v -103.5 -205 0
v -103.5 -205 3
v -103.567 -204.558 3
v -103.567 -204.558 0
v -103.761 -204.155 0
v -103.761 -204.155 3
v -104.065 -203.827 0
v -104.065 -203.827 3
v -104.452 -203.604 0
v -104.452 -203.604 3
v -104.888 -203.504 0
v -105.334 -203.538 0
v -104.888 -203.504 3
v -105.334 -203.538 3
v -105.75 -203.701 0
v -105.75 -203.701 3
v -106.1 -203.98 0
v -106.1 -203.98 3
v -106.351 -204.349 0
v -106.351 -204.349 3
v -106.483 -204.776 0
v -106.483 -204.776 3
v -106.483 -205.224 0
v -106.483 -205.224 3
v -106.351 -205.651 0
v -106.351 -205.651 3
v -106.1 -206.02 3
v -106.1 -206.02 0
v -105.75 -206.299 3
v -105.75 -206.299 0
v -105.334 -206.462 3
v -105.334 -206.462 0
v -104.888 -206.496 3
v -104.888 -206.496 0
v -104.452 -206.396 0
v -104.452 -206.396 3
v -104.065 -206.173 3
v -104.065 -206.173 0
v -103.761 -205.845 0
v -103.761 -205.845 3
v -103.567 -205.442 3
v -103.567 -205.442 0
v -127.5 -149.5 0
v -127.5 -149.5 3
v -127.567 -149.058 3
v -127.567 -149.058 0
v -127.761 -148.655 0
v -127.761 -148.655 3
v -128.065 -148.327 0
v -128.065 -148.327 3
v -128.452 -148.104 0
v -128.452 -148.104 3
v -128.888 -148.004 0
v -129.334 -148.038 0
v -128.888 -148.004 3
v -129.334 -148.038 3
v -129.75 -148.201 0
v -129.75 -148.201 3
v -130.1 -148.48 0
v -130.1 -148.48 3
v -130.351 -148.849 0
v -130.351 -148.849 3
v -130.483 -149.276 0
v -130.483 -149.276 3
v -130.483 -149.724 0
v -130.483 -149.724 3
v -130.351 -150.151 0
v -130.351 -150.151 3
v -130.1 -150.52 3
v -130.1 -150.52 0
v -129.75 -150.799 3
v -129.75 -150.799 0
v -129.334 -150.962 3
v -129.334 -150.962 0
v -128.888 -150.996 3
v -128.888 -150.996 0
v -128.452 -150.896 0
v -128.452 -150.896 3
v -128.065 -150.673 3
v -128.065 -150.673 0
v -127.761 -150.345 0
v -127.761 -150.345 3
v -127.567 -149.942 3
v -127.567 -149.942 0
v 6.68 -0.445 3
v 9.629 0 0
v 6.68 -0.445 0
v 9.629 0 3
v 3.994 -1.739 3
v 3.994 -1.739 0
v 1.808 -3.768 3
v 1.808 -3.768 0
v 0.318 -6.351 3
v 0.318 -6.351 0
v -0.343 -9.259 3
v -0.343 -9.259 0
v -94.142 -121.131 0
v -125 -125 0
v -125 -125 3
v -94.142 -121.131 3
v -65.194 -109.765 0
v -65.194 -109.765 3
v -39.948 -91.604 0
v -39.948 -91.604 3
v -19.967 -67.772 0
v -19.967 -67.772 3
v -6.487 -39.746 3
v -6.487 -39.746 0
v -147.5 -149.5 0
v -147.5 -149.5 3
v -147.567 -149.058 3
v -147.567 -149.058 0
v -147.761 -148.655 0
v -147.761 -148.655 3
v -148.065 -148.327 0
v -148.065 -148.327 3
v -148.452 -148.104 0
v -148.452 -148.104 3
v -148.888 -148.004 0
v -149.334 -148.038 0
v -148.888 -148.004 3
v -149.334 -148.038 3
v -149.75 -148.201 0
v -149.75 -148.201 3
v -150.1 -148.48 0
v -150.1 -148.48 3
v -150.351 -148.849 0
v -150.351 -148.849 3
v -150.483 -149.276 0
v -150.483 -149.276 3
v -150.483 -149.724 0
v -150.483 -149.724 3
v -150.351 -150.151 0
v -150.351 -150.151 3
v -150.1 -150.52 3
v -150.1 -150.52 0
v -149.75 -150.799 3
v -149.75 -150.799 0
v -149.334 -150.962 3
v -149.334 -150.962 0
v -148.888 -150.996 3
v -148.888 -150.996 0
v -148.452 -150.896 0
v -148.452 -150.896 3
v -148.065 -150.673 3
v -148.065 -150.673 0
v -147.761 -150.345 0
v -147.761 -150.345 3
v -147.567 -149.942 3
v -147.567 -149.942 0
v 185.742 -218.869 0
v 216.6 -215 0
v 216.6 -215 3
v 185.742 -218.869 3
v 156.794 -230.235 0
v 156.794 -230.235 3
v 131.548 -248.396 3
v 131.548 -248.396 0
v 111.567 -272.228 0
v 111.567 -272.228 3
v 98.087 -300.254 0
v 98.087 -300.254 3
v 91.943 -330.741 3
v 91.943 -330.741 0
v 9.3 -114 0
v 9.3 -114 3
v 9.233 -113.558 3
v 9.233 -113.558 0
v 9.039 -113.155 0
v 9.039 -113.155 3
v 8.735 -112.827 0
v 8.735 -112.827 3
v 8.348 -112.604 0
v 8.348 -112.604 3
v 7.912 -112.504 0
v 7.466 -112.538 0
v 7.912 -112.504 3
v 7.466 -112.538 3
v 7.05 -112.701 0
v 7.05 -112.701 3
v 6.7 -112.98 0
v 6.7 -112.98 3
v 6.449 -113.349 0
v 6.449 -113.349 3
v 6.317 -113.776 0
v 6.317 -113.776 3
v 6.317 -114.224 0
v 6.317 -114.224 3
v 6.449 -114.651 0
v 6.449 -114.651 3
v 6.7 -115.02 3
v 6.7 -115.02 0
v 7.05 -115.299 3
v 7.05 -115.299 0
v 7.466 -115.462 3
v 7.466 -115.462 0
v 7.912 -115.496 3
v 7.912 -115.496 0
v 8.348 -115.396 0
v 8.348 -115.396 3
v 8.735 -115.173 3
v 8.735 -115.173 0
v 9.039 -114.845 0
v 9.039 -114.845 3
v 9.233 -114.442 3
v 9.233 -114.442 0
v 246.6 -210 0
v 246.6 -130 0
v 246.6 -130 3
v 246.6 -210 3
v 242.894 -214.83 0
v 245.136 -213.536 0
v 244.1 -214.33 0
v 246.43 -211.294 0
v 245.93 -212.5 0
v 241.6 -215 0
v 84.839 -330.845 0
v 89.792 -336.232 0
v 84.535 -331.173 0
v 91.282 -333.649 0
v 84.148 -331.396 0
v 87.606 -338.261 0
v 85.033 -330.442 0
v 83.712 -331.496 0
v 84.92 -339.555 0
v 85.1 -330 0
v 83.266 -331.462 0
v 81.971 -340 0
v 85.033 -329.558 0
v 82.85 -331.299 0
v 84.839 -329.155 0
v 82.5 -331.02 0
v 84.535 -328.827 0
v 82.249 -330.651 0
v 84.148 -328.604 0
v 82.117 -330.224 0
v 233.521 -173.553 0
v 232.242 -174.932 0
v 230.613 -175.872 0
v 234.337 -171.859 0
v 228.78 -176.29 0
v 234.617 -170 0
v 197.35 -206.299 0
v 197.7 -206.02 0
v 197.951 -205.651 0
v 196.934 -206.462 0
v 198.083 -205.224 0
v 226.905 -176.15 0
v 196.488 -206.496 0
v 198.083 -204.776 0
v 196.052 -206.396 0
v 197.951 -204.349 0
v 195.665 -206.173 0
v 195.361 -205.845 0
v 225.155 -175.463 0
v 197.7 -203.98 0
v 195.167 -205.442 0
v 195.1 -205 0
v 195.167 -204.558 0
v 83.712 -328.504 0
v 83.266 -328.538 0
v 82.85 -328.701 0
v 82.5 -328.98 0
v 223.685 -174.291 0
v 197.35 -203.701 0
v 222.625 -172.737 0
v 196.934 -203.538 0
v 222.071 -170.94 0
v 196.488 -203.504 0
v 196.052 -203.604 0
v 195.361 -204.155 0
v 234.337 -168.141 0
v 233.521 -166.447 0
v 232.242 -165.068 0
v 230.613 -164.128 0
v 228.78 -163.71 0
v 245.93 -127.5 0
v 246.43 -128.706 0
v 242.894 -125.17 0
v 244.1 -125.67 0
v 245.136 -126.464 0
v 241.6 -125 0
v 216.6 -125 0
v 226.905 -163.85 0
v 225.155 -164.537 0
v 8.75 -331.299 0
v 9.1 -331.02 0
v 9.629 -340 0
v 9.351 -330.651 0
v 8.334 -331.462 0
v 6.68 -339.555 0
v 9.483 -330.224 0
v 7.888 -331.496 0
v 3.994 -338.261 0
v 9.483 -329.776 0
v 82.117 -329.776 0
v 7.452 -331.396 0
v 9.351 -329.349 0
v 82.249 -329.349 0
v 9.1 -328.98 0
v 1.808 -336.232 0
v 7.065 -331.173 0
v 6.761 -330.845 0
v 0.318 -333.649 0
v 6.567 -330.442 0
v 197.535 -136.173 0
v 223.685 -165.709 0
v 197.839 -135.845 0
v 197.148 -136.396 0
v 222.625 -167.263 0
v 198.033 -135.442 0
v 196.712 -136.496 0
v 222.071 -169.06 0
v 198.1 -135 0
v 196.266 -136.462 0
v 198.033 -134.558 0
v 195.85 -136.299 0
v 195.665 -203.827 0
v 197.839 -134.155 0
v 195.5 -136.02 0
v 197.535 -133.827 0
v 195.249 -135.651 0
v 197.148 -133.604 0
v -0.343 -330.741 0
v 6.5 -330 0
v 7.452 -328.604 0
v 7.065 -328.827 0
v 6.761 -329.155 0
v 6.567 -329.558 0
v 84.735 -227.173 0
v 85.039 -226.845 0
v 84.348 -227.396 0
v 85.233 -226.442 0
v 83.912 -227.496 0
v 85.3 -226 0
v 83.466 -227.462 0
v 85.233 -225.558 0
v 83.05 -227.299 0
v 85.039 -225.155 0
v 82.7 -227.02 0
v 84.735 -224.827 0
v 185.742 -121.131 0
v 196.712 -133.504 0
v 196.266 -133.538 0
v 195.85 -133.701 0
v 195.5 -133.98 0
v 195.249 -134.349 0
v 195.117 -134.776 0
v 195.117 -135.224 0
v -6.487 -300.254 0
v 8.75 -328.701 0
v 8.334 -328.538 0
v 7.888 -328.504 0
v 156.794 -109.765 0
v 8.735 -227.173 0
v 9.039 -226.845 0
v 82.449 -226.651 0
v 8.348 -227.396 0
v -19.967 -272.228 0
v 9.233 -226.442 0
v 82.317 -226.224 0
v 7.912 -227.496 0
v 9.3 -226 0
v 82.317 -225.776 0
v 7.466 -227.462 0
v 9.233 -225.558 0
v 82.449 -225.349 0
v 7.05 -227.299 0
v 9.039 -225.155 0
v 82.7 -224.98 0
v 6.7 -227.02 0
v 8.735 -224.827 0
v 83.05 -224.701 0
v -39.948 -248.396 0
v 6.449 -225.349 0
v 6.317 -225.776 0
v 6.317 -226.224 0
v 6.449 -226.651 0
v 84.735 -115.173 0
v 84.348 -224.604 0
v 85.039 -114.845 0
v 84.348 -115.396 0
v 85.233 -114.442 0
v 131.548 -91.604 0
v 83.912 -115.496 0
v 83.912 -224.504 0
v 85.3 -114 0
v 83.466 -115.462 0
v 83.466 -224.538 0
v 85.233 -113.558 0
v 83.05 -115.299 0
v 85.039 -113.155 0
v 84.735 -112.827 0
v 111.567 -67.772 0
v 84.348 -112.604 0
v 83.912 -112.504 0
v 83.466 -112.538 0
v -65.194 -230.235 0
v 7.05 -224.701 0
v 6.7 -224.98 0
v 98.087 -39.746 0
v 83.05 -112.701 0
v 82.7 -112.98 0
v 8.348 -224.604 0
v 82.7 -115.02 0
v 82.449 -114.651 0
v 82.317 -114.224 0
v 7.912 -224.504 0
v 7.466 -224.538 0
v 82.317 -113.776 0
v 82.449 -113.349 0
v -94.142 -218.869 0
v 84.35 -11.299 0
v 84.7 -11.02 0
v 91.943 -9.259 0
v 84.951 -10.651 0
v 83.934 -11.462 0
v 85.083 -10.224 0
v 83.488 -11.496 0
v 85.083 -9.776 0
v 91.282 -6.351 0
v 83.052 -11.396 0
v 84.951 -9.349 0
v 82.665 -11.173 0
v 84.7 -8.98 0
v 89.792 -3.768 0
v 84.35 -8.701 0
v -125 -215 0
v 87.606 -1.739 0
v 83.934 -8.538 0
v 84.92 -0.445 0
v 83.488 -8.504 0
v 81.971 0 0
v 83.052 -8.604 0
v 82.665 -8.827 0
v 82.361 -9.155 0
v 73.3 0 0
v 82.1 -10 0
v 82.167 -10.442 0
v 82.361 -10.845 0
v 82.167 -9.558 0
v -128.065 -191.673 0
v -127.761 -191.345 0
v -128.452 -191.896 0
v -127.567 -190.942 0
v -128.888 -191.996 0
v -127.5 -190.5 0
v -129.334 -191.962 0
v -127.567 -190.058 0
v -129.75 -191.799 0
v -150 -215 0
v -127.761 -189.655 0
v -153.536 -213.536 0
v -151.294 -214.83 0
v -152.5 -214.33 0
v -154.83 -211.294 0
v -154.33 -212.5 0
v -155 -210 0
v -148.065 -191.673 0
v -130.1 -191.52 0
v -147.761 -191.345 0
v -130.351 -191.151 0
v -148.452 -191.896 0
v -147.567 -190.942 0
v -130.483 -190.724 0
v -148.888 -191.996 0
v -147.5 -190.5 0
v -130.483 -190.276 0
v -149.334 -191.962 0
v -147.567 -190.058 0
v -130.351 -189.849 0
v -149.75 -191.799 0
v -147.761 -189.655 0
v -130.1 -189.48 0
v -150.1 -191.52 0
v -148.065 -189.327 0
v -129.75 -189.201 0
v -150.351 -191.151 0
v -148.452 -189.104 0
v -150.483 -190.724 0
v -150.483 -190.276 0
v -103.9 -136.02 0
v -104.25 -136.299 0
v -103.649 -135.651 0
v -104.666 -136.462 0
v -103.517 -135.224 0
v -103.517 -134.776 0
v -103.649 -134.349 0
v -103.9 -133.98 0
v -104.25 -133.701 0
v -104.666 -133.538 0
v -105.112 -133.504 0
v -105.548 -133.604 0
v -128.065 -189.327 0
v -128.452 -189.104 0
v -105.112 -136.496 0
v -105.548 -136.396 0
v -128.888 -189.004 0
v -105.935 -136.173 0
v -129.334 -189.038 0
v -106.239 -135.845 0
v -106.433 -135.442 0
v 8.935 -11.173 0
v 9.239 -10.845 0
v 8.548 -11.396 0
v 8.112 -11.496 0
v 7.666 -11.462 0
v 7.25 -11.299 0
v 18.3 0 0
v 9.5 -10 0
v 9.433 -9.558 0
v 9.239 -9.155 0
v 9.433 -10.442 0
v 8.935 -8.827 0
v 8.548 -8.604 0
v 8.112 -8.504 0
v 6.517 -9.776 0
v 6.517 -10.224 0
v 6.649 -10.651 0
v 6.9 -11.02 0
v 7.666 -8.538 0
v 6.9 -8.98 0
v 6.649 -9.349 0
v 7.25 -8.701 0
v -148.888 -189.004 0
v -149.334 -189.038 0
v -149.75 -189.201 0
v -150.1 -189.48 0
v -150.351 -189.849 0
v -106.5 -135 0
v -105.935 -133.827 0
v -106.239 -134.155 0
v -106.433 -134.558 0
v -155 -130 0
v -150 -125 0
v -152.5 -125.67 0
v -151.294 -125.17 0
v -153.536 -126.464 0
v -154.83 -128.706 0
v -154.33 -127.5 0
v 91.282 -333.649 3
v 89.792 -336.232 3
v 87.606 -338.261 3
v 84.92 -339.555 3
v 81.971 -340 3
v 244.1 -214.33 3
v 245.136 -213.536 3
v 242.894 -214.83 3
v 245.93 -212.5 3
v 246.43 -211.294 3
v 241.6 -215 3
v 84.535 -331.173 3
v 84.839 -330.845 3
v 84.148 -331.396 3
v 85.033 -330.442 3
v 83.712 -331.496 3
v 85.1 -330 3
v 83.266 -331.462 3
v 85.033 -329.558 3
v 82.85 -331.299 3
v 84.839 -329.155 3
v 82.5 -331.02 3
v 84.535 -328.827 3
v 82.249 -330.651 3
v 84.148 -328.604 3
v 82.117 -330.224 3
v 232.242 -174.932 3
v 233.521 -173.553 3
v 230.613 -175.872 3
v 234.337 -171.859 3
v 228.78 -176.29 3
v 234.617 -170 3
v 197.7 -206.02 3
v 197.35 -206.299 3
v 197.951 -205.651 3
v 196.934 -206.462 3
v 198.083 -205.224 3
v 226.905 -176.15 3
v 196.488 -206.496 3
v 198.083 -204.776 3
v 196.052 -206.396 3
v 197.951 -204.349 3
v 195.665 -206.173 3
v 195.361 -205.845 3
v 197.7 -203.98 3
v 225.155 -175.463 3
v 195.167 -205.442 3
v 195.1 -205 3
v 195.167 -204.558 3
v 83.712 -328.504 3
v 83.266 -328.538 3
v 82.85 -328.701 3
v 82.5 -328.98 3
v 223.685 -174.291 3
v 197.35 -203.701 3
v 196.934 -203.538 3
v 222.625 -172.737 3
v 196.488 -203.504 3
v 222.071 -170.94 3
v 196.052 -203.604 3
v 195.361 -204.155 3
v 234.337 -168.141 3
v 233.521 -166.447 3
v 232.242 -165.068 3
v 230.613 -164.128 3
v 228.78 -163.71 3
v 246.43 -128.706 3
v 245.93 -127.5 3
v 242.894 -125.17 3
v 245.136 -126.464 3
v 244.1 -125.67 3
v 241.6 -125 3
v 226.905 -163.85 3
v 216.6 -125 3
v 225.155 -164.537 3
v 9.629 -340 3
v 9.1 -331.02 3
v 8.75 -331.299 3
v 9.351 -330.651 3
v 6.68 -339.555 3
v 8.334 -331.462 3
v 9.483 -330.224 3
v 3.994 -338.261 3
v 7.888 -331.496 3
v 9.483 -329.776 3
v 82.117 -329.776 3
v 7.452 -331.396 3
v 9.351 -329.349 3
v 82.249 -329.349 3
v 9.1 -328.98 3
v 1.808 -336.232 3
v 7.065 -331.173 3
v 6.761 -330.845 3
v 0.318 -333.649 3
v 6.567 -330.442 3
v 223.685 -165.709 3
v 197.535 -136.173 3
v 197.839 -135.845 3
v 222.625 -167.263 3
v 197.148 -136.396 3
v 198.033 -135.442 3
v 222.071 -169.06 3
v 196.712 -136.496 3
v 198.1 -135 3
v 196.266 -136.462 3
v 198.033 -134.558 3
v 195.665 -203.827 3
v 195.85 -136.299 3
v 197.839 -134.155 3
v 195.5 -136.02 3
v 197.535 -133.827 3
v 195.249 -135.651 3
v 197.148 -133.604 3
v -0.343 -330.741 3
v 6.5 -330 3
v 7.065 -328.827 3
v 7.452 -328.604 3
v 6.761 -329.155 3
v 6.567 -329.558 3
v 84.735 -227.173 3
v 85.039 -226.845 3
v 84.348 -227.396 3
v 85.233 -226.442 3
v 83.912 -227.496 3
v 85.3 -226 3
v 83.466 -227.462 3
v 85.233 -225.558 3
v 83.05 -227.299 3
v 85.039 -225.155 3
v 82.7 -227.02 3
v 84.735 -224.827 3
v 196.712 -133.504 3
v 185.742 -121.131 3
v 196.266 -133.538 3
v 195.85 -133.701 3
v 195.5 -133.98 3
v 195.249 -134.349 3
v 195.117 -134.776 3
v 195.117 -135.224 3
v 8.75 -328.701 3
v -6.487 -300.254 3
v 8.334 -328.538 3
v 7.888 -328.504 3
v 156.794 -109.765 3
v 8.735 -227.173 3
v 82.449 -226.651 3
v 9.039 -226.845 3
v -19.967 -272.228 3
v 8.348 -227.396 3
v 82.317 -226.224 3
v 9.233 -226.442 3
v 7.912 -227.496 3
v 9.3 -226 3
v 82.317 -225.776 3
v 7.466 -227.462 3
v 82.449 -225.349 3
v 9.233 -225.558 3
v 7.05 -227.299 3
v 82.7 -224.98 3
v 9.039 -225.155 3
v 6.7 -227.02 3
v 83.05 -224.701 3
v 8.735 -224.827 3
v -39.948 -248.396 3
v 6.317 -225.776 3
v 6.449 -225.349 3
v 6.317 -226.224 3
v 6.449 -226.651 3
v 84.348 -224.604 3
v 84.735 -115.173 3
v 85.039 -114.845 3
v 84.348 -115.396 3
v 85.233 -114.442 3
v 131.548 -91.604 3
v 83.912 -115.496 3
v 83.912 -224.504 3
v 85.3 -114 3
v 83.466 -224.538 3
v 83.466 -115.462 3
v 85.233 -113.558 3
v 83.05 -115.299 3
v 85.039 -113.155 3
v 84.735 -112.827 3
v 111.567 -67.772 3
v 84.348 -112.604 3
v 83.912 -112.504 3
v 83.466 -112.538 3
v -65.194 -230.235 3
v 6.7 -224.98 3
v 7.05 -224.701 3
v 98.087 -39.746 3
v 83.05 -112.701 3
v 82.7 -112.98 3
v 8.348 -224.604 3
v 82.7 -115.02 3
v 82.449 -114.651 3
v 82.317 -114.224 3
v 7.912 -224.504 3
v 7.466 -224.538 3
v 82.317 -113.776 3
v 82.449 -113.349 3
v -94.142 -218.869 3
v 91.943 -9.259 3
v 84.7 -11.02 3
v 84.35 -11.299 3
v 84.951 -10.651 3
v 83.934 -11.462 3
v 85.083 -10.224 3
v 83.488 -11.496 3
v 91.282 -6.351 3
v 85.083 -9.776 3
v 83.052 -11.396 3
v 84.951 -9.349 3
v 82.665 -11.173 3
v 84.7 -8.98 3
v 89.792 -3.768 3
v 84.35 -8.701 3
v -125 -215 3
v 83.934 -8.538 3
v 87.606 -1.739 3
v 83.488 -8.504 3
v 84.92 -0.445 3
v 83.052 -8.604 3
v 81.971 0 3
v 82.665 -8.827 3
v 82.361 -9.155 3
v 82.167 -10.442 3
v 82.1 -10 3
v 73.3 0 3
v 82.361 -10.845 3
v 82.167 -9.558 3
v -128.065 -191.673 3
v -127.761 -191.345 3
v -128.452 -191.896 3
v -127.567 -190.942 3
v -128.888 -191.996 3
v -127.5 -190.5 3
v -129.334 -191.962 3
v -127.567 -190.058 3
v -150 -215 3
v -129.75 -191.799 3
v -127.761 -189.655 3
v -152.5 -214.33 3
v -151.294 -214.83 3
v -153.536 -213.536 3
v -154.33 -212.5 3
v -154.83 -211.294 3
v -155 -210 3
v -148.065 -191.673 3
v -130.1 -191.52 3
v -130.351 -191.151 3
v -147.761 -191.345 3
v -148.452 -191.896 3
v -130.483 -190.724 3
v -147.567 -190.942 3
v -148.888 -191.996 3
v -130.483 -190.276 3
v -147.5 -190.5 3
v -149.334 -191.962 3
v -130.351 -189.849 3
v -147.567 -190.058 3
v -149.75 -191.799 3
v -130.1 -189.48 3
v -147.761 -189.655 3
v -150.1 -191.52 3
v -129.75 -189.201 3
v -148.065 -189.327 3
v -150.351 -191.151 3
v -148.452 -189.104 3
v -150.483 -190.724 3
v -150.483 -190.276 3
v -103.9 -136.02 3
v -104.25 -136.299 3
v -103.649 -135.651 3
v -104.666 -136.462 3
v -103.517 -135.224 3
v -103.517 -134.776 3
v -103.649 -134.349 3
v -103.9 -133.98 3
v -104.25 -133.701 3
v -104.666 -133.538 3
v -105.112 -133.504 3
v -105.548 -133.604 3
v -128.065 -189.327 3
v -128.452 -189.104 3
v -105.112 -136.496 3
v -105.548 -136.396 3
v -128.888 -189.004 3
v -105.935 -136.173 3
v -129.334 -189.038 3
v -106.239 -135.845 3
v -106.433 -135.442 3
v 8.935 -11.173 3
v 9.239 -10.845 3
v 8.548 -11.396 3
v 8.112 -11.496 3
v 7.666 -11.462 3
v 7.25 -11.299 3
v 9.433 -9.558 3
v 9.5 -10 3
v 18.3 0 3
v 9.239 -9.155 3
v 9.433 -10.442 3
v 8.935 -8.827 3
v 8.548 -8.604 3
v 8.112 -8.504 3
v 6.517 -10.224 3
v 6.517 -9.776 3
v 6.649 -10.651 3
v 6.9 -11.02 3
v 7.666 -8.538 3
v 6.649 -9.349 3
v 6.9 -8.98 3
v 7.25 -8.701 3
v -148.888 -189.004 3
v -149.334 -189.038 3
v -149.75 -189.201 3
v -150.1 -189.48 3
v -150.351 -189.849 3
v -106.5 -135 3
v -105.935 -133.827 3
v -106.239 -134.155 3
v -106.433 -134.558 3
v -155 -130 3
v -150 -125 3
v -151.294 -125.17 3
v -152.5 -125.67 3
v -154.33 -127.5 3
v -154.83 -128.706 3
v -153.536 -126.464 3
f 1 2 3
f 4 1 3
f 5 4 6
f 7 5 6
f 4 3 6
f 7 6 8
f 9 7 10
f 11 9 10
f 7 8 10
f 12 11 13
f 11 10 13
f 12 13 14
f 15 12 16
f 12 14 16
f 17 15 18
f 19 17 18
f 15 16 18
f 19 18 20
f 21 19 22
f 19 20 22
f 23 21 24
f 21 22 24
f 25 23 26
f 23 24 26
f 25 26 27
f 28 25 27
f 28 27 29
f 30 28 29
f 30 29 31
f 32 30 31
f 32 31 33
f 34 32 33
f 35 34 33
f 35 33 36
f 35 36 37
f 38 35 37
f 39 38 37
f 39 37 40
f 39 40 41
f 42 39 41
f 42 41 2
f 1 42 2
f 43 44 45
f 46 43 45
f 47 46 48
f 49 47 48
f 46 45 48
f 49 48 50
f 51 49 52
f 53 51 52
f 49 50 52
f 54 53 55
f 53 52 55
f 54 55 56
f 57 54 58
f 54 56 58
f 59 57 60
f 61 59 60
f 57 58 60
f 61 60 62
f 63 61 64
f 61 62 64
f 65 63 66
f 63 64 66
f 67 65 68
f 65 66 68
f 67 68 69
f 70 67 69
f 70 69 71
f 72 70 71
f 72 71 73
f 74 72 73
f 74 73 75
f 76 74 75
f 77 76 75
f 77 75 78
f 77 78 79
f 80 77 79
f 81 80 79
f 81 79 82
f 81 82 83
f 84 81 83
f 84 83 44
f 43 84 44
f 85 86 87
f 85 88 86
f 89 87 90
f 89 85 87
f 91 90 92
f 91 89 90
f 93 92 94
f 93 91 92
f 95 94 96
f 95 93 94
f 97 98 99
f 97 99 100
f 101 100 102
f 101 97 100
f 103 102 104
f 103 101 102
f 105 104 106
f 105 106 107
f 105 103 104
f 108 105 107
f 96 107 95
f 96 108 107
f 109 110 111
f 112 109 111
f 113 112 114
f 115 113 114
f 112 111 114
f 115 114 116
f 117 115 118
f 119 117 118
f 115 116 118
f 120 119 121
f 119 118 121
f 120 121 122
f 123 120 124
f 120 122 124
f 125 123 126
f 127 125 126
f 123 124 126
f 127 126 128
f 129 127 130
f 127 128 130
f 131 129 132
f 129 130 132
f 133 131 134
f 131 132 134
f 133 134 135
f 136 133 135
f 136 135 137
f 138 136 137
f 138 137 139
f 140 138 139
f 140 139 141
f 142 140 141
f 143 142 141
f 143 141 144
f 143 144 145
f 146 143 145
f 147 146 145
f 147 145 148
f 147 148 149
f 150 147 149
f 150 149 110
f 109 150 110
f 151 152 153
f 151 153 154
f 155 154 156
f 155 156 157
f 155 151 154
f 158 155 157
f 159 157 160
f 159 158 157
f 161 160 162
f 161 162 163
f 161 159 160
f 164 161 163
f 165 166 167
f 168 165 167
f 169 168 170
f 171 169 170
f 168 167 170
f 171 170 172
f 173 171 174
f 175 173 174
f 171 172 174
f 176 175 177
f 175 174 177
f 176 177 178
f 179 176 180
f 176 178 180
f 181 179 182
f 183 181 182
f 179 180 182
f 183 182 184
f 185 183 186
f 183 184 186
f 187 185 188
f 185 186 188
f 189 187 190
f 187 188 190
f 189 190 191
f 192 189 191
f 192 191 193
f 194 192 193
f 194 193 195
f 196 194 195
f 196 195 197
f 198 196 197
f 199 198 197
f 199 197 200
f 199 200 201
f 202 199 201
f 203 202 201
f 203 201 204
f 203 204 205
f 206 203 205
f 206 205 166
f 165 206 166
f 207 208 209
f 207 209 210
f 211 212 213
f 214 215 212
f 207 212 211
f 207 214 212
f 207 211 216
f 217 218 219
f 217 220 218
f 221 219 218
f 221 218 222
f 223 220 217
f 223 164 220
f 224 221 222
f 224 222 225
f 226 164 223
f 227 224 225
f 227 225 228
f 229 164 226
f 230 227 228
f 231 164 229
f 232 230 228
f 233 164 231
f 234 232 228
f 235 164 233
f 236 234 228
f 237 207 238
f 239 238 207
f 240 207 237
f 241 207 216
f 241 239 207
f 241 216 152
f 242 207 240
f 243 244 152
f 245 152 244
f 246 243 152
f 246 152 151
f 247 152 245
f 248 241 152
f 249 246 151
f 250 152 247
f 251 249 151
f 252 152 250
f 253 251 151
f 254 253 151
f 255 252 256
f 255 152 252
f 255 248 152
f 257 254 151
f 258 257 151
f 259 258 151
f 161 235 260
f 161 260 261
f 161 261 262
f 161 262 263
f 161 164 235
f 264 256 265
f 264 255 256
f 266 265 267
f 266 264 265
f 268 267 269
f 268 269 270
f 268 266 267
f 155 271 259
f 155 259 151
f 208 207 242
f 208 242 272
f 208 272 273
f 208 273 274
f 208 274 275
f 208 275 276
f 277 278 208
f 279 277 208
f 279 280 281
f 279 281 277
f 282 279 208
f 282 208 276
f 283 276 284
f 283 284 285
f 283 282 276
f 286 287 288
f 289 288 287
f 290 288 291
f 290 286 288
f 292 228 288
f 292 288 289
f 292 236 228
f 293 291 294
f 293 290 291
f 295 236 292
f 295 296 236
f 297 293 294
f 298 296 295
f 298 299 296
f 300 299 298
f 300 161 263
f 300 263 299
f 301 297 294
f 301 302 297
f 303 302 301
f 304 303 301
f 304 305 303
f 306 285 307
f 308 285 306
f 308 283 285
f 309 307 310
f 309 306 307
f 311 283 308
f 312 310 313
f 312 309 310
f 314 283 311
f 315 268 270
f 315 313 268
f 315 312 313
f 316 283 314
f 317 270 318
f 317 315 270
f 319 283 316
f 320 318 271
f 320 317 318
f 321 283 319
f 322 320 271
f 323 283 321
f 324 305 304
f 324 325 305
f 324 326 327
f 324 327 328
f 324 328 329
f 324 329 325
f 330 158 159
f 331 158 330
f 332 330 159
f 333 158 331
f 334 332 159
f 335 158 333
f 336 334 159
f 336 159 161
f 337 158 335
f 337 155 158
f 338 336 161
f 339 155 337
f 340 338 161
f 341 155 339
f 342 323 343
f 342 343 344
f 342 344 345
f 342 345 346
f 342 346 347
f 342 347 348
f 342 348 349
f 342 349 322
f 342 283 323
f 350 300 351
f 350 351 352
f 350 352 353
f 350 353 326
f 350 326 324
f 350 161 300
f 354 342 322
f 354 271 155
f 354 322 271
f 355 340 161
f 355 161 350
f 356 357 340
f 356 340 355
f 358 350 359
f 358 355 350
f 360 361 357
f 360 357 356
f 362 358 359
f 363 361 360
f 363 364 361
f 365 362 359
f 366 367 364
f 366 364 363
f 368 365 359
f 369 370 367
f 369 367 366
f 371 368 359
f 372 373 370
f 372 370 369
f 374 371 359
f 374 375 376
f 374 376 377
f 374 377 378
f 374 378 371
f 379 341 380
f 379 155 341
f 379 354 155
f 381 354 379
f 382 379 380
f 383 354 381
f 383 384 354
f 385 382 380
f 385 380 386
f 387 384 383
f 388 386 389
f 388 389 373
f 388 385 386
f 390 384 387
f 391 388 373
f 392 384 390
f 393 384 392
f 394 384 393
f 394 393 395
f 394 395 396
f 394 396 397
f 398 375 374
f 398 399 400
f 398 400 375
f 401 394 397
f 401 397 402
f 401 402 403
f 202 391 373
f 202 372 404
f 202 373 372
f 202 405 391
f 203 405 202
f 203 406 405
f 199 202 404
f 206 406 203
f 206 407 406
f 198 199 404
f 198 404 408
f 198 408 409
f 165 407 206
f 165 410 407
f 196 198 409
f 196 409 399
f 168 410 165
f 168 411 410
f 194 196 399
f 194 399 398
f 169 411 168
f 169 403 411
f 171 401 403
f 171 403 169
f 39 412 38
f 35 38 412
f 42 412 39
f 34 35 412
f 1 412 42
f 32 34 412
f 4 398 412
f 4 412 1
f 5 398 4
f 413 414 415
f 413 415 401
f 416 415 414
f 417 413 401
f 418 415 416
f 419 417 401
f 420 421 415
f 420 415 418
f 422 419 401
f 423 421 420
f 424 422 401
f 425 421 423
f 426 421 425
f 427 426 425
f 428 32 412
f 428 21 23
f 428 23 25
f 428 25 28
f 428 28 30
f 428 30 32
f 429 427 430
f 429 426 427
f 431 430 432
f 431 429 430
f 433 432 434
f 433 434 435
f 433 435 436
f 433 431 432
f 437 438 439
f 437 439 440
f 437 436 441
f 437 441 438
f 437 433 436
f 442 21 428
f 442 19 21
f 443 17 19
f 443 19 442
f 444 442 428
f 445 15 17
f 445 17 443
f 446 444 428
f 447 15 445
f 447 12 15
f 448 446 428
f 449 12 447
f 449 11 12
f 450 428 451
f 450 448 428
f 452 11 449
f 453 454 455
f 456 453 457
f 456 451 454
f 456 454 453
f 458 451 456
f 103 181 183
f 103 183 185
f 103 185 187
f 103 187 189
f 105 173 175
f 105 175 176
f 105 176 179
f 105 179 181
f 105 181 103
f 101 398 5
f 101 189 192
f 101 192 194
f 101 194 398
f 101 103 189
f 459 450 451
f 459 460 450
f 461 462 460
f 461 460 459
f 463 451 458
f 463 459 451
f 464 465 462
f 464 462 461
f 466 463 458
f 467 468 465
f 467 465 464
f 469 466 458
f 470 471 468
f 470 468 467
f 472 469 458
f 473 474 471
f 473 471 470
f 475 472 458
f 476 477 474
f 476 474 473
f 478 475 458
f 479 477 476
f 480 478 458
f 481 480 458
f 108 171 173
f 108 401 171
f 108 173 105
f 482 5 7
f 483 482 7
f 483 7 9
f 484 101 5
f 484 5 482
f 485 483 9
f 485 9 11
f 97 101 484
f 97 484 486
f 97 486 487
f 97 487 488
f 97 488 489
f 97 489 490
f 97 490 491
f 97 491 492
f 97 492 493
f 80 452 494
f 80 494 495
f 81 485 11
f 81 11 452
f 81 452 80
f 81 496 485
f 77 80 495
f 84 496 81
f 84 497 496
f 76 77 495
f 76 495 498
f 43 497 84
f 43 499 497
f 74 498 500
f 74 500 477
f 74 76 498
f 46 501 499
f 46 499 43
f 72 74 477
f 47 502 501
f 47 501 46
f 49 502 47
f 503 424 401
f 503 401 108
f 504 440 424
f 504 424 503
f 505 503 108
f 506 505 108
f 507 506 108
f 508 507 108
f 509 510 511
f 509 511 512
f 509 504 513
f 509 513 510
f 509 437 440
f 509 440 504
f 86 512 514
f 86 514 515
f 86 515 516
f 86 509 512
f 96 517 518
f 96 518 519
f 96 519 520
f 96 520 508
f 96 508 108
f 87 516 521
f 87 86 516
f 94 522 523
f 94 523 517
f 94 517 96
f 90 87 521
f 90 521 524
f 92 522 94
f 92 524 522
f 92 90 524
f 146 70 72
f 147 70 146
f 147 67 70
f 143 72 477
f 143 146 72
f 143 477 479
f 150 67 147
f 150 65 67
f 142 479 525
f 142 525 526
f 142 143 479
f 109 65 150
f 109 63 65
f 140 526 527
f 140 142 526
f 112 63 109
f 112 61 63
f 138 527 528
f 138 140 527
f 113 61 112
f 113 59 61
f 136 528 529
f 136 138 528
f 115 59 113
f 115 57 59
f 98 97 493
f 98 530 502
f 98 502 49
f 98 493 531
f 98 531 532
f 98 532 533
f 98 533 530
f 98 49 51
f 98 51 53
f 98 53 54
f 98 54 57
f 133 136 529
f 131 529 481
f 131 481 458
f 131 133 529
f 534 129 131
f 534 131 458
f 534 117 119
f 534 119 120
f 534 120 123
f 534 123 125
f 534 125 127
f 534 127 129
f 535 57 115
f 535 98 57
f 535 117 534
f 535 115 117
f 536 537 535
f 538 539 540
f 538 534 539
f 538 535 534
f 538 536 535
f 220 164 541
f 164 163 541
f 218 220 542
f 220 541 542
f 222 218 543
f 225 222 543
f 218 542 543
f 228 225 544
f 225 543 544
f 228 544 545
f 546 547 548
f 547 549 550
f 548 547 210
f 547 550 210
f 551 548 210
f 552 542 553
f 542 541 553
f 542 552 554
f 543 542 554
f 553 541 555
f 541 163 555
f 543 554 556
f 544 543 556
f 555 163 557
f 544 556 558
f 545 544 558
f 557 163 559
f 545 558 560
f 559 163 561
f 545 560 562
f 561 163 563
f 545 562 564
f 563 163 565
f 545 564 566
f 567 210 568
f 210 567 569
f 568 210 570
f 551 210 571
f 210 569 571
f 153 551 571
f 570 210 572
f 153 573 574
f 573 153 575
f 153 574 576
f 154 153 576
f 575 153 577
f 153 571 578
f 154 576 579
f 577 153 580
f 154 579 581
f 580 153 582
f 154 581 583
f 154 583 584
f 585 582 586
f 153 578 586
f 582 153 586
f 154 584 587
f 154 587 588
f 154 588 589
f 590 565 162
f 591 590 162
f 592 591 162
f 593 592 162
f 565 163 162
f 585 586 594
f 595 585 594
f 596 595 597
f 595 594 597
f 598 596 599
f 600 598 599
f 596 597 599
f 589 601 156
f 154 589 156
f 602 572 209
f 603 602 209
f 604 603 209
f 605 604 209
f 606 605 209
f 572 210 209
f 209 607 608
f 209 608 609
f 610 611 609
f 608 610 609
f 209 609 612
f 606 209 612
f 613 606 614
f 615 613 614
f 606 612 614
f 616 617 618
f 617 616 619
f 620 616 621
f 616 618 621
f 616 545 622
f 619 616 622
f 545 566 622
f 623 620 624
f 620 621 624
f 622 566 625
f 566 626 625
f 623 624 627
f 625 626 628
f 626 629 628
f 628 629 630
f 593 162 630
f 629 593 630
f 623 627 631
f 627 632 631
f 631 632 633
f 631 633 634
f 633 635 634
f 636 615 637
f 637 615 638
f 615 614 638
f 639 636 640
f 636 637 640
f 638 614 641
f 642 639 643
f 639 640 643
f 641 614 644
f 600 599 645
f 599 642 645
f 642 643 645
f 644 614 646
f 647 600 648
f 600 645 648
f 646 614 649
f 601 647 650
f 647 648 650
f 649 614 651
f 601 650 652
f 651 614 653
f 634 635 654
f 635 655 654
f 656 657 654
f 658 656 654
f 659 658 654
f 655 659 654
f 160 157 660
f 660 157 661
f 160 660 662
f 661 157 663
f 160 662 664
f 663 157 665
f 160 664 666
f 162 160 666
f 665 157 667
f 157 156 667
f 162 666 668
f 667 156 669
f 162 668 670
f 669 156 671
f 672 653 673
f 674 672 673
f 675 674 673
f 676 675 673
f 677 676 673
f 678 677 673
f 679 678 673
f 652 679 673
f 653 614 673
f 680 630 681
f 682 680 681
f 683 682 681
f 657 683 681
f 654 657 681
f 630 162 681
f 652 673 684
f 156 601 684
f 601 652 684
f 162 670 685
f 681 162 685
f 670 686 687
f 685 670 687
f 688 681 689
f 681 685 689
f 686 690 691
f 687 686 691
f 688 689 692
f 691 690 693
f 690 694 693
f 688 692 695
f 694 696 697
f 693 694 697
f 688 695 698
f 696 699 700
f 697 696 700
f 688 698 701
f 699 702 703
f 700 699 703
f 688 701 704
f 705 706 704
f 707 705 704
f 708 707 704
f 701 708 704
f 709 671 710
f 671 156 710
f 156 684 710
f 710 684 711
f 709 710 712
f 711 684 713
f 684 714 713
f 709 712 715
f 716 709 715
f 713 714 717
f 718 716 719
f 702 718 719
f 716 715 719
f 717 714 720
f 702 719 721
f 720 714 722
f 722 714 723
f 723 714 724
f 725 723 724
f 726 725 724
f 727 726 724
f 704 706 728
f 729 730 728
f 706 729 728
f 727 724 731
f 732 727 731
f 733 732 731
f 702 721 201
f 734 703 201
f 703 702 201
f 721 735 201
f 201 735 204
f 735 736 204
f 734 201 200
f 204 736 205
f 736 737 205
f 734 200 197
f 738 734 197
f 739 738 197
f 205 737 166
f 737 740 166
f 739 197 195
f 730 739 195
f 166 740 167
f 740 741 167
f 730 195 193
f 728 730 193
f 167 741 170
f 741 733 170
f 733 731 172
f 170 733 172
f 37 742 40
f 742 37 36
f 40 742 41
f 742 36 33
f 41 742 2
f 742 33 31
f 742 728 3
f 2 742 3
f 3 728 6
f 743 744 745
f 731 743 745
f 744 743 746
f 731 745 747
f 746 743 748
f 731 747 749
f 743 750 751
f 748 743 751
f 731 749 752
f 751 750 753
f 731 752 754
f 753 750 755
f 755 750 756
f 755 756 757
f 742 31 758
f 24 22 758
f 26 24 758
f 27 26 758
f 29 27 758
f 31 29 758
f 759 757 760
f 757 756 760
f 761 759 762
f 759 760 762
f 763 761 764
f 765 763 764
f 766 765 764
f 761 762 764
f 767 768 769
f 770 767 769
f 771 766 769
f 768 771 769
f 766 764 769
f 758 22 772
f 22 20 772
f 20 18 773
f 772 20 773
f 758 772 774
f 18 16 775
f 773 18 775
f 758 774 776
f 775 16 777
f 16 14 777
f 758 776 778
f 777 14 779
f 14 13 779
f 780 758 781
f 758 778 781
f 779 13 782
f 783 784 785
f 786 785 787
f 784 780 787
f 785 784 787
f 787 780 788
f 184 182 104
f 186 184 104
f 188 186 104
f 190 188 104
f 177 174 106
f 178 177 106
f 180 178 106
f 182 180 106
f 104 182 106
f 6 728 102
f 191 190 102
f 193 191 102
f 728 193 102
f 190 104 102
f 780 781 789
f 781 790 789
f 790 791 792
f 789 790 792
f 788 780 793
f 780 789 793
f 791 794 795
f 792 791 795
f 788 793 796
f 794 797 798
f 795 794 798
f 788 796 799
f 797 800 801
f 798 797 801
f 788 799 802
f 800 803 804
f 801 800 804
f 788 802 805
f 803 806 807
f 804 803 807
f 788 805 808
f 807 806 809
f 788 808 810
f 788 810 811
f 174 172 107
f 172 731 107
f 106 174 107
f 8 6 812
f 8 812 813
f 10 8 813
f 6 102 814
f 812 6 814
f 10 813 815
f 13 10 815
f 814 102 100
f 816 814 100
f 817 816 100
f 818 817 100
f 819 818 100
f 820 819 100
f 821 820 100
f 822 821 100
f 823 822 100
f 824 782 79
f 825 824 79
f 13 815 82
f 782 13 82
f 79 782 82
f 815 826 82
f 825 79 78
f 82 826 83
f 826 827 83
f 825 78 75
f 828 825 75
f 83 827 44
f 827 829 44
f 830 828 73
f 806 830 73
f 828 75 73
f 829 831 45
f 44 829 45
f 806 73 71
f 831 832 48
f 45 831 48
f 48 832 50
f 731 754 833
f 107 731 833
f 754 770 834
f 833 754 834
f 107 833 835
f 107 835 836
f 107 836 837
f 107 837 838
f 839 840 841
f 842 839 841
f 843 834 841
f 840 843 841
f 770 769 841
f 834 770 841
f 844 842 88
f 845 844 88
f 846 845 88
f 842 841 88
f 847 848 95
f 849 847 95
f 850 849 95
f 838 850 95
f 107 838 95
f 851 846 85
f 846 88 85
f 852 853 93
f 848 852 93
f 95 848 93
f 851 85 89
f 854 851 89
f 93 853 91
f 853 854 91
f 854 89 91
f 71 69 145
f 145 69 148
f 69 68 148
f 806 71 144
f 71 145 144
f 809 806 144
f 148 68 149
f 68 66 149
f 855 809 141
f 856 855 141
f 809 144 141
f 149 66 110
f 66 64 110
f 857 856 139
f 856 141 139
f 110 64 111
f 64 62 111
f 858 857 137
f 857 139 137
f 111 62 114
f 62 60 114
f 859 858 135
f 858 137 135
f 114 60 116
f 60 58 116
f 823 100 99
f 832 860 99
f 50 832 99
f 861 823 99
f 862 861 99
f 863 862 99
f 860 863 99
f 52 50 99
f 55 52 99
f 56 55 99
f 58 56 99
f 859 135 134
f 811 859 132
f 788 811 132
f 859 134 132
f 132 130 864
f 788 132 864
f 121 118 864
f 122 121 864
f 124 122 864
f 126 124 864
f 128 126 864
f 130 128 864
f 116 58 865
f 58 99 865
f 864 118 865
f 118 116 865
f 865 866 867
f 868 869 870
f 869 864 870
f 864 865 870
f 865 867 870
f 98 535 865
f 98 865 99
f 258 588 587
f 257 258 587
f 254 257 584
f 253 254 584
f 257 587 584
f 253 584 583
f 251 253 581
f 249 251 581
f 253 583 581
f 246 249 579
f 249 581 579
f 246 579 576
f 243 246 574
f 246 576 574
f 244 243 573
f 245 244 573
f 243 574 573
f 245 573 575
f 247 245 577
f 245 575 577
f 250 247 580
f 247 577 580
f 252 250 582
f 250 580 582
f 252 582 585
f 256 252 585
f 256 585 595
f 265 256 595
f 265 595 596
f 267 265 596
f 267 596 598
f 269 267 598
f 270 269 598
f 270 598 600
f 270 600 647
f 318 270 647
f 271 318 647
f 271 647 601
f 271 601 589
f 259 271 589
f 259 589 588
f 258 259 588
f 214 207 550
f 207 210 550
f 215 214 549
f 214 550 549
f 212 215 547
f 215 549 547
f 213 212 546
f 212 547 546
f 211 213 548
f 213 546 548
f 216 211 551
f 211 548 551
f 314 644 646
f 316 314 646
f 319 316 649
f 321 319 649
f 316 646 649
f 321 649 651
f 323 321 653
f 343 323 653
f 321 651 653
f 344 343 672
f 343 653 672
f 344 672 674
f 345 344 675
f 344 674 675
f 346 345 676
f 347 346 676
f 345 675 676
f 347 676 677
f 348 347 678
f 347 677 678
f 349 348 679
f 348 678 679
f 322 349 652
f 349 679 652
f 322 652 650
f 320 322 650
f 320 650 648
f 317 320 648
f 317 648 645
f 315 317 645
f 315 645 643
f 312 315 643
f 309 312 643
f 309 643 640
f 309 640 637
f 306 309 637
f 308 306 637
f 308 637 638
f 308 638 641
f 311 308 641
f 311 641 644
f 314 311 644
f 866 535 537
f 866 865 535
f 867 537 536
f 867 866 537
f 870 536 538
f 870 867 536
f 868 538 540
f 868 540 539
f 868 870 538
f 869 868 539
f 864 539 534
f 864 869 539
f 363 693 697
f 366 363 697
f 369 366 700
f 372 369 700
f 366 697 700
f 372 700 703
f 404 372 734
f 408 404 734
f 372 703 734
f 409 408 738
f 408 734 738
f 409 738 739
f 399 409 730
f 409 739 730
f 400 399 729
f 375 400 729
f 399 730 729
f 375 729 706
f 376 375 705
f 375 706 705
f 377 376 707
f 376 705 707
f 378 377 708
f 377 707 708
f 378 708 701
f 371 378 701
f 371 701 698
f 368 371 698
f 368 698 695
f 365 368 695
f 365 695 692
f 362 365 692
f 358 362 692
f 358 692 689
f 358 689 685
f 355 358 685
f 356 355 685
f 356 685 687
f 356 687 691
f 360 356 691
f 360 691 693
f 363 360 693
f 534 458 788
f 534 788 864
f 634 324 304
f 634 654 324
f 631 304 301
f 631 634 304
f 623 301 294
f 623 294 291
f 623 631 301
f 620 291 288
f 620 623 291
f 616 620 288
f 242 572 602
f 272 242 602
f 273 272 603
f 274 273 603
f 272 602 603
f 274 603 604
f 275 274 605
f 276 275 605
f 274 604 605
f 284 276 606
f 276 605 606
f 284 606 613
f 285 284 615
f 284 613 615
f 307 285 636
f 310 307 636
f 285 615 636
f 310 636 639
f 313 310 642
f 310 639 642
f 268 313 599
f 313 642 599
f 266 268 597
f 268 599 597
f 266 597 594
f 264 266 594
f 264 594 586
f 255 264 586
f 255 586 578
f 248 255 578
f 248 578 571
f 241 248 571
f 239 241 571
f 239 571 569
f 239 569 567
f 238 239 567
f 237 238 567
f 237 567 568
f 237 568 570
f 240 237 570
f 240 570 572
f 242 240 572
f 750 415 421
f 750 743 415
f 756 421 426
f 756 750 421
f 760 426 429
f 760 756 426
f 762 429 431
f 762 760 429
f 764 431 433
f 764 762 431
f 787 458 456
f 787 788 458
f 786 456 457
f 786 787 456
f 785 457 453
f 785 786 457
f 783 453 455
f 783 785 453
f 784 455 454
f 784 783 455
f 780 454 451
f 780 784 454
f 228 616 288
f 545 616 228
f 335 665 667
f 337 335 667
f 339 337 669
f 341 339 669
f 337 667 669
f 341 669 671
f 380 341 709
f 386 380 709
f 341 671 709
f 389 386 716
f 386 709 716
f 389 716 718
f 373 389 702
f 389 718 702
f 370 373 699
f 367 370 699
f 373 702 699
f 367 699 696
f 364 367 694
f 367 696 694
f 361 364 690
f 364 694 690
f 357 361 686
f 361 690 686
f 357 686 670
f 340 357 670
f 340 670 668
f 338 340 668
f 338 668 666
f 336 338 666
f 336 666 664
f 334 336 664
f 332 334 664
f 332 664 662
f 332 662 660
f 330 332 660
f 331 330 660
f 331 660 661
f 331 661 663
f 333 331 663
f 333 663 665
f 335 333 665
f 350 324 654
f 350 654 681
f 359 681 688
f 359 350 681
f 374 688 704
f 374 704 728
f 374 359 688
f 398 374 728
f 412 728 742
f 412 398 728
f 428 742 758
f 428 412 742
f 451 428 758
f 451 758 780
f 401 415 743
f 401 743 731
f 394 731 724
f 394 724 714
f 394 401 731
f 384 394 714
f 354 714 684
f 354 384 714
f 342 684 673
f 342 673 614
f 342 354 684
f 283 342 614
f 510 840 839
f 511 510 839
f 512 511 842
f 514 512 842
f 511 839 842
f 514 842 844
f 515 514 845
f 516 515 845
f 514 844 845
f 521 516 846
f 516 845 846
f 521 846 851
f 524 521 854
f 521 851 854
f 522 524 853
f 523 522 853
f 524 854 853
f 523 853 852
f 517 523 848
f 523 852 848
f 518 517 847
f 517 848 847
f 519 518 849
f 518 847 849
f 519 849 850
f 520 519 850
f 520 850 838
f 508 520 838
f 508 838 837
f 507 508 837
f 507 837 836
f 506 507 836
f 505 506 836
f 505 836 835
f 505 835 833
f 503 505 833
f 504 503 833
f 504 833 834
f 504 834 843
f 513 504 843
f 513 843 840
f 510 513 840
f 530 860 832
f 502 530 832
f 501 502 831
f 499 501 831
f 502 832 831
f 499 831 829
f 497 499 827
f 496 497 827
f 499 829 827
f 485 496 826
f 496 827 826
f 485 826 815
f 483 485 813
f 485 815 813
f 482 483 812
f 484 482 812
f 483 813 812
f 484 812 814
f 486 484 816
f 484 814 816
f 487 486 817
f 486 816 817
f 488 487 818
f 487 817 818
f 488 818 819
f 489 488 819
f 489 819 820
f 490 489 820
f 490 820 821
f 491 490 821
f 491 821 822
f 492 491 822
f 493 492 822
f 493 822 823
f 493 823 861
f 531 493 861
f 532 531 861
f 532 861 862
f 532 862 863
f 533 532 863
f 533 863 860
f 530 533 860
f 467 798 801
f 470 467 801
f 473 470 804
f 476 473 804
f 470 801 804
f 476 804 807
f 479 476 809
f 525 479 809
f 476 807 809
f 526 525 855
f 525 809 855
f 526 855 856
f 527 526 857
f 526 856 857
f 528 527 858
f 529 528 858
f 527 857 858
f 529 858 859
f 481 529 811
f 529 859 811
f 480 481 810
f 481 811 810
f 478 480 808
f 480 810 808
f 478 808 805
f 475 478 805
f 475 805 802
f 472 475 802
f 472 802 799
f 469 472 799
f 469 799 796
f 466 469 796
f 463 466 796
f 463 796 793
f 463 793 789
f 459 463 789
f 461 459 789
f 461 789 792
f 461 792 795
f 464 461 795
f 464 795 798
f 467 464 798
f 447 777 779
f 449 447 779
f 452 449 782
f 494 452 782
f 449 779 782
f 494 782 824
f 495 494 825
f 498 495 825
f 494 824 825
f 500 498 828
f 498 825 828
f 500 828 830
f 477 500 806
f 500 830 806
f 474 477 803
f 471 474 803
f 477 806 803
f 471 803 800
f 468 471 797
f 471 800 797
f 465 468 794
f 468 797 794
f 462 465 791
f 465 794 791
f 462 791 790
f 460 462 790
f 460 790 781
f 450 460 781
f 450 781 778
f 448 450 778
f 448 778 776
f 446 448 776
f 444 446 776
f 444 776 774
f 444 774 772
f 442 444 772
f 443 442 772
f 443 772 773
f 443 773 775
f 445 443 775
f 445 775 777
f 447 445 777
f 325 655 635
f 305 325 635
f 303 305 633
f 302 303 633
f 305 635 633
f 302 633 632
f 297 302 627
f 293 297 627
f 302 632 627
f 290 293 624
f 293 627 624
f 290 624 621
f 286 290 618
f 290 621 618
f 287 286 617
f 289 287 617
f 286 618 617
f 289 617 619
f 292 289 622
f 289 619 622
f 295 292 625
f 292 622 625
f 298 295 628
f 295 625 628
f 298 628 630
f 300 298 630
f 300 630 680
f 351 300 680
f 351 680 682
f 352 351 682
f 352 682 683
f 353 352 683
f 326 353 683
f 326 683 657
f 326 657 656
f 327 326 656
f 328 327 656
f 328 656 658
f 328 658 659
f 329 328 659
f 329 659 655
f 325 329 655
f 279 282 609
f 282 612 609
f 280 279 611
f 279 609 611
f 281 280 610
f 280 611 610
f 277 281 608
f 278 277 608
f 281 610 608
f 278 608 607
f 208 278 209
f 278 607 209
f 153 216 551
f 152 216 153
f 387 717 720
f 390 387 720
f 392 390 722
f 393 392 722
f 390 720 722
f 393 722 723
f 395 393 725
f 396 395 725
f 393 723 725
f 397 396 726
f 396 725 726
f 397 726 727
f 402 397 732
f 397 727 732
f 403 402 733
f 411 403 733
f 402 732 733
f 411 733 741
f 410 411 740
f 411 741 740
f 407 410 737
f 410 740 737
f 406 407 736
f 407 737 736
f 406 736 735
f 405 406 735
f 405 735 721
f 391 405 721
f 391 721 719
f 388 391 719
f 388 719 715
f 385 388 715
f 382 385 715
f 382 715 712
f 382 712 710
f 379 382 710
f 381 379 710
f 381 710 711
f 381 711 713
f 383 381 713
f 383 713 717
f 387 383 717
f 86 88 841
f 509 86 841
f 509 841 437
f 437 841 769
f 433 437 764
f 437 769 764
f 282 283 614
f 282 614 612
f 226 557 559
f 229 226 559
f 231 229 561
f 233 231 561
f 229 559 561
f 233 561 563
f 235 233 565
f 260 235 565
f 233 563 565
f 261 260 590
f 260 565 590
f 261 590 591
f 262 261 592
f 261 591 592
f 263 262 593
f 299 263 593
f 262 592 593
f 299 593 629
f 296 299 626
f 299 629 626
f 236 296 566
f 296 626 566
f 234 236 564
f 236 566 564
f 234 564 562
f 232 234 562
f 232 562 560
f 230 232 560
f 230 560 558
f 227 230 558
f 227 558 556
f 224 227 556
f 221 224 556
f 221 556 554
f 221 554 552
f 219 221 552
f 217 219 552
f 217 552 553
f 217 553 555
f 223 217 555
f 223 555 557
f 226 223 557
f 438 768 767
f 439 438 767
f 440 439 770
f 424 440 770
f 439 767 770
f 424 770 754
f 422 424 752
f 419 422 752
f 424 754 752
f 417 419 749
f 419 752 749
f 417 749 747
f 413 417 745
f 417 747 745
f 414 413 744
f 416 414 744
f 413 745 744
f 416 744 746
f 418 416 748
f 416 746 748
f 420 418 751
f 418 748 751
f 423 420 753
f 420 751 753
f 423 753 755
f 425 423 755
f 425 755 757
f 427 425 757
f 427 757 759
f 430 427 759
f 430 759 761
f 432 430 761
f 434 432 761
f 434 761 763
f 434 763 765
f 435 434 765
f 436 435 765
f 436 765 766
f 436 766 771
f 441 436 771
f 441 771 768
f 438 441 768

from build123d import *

# Parameters (mm, degrees)
EXTRUDE_1_DEPTH      = 3
SKETCH_4_R           = 1.5
CUT_EXTRUDE_2_DEPTH  = 10
SKETCH_5_R           = 1.5
CUT_EXTRUDE_3_DEPTH  = 10
FILLET_1_R           = 5
SKETCH_6_W           = 116.747996977
SKETCH_6_H           = 25
SKETCH_6_W_2         = 124.073590325
SKETCH_6_W_3         = 98.220869454
SKETCH_6_W_4         = 117.634329044
CUT_EXTRUDE_4_DEPTH  = 10
SKETCH_7_W           = 65
SKETCH_7_H           = 110
CUT_EXTRUDE_5_DEPTH  = 10
FILLET_2_R           = 5
FILLET_3_R           = 5
SKETCH_9_R           = 6.308122895
CUT_EXTRUDE_7_DEPTH  = 10
SKETCH_10_R          = 1.5
CUT_EXTRUDE_8_DEPTH  = 10
SKETCH_11_R          = 1.5
CUT_EXTRUDE_9_DEPTH  = 10
SKETCH_12_W          = 120.586074841
SKETCH_12_H          = 63.347236109
SKETCH_12_W_2        = 131.774283424
SKETCH_12_H_2        = 66.604431946
CUT_EXTRUDE_10_DEPTH = 10
FILLET_4_R           = 10


with BuildPart() as part:
    # 草图2 → 凸台-拉伸1 (new body)
    with BuildSketch(Plane.XY):
        with BuildLine():
            Line((-16.583123952, 25), (0, 25))
            Line((0, 25), (0, 55))
            Line((0, 55), (91.6, 55))
            Line((91.6, 55), (91.6, 25))
            Line((91.6, 25), (108.183123952, 25))
            Line((108.183123952, 25), (188.183123952, 25))
            Line((188.183123952, 25), (188.183123952, 0))
            Line((188.183123952, 0), (91.6, 0))
            ThreePointArc((91.6, 0), (128.211652352, -88.388347648), (216.6, -125))
            Line((216.6, -125), (246.6, -125))
            Line((246.6, -125), (246.6, -215))
            Line((246.6, -215), (216.6, -215))
            ThreePointArc((216.6, -215), (128.211652352, -251.611652352), (91.6, -340))
            Line((91.6, -340), (188.183123952, -340))
            Line((188.183123952, -340), (188.183123952, -365))
            Line((188.183123952, -365), (108.183123952, -365))
            Line((108.183123952, -365), (91.6, -365))
            Line((91.6, -365), (91.6, -395))
            Line((91.6, -395), (0, -395))
            Line((0, -395), (0, -365))
            Line((0, -365), (-16.583123952, -365))
            Line((-16.583123952, -365), (-96.583123952, -365))
            Line((-96.583123952, -365), (-96.583123952, -340))
            Line((-96.583123952, -340), (0, -340))
            ThreePointArc((0, -340), (-36.611652352, -251.611652352), (-125, -215))
            Line((-125, -215), (-155, -215))
            Line((-155, -215), (-155, -125))
            Line((-155, -125), (-125, -125))
            ThreePointArc((-125, -125), (-36.611652352, -88.388347648), (0, 0))
            Line((0, 0), (-96.583123952, 0))
            Line((-96.583123952, 0), (-96.583123952, 25))
            Line((-96.583123952, 25), (-16.583123952, 25))
        make_face()
    extrude(amount=EXTRUDE_1_DEPTH)

    # 草图4 → 切除-拉伸2 (cut)
    with BuildSketch(Plane.XY.offset(3)):
        with Locations((-90.583123952, 20)):
            Circle(SKETCH_4_R)
        with Locations(Location((-90.583123952, 5, 0), (0, 0, 180))):
            Circle(SKETCH_4_R)
        with Locations((-90.583123952, -345)):
            Circle(SKETCH_4_R)
        with Locations(Location((-90.583123952, -360, 0), (0, 0, 180))):
            Circle(SKETCH_4_R)
        with Locations((182.183123952, -360)):
            Circle(SKETCH_4_R)
        with Locations(Location((182.183123952, -345, 0), (0, 0, 180))):
            Circle(SKETCH_4_R)
        with Locations((182.183123952, 5)):
            Circle(SKETCH_4_R)
        with Locations(Location((182.183123952, 20, 0), (0, 0, 180))):
            Circle(SKETCH_4_R)
    extrude(amount=-CUT_EXTRUDE_2_DEPTH, mode=Mode.SUBTRACT)

    # 草图5 → 切除-拉伸3 (cut)
    with BuildSketch(Plane.XY.offset(3)):
        with Locations((8, -10)):
            Circle(SKETCH_5_R)
        with Locations(Location((83.6, -10, 0), (0, 0, 180))):
            Circle(SKETCH_5_R)
        with Locations((83.6, -330)):
            Circle(SKETCH_5_R)
        with Locations(Location((8, -330, 0), (0, 0, 180))):
            Circle(SKETCH_5_R)
        with Locations((196.6, -135)):
            Circle(SKETCH_5_R)
        with Locations(Location((196.6, -205, 0), (0, 0, 180))):
            Circle(SKETCH_5_R)
        with Locations((-105, -205)):
            Circle(SKETCH_5_R)
        with Locations(Location((-105, -135, 0), (0, 0, 180))):
            Circle(SKETCH_5_R)
    extrude(amount=-CUT_EXTRUDE_3_DEPTH, mode=Mode.SUBTRACT)

    # 圆角1
    fillet_1_edges = [part.edges().sort_by_distance(p)[0] for p in [
        (-96.583123952, 0, 1.5),
        (-96.583123952, 25, 1.5),
        (0, 55, 1.5),
        (91.6, 55, 1.5),
        (188.183123952, 25, 1.5),
        (188.183123952, 0, 1.5),
        (246.6, -125, 1.5),
        (246.6, -215, 1.5),
        (188.183123952, -340, 1.5),
        (188.183123952, -365, 1.5),
        (91.6, -395, 1.5),
        (0, -395, 1.5),
        (-96.583123952, -365, 1.5),
        (-96.583123952, -340, 1.5),
        (-155, -215, 1.5),
        (-155, -125, 1.5),
    ]]
    fillet(fillet_1_edges, radius=FILLET_1_R)

    # 草图6 → 切除-拉伸4 (cut)
    with BuildSketch(Plane.XY.offset(3)):
        with Locations((-58.373998489, 12.5)):
            Rectangle(SKETCH_6_W, SKETCH_6_H)
        with Locations((153.636795163, 12.5)):
            Rectangle(SKETCH_6_W_2, SKETCH_6_H)
        with Locations((-49.110434727, -352.5)):
            Rectangle(SKETCH_6_W_3, SKETCH_6_H)
        with Locations((150.417164522, -352.5)):
            Rectangle(SKETCH_6_W_4, SKETCH_6_H)
    extrude(amount=-CUT_EXTRUDE_4_DEPTH, mode=Mode.SUBTRACT)

    # 草图7 → 切除-拉伸5 (cut)
    with BuildSketch(Plane.XY.offset(3)):
        with Locations((45.8, 55)):
            Rectangle(SKETCH_7_W, SKETCH_7_H)
        with Locations((45.8, -395)):
            Rectangle(SKETCH_7_W, SKETCH_7_H)
    extrude(amount=-CUT_EXTRUDE_5_DEPTH, mode=Mode.SUBTRACT)

    # 圆角2
    fillet_2_edges = [part.edges().sort_by_distance(p)[0] for p in [
        (13.3, 55, 1.5),
        (78.3, 55, 1.5),
        (78.3, -395, 1.5),
        (13.3, -395, 1.5),
    ]]
    fillet(fillet_2_edges, radius=FILLET_2_R)

    # 圆角3
    fillet_3_edges = [part.edges().sort_by_distance(p)[0] for p in [
        (13.3, 0, 1.5),
        (78.3, 0, 1.5),
        (78.3, -340, 1.5),
        (13.3, -340, 1.5),
    ]]
    fillet(fillet_3_edges, radius=FILLET_3_R)

    # 草图9 → 切除-拉伸7 (cut)
    with BuildSketch(Plane.XY.offset(3)):
        with Locations((228.308745857, -170)):
            Circle(SKETCH_9_R)
    extrude(amount=-CUT_EXTRUDE_7_DEPTH, mode=Mode.SUBTRACT)

    # 草图10 → 切除-拉伸8 (cut)
    with BuildSketch(Plane.XY.offset(3)):
        with Locations((-149, -149.5)):
            Circle(SKETCH_10_R)
        with Locations((-129, -149.5)):
            Circle(SKETCH_10_R)
        with Locations((-149, -190.5)):
            Circle(SKETCH_10_R)
        with Locations((-129, -190.5)):
            Circle(SKETCH_10_R)
    extrude(amount=-CUT_EXTRUDE_8_DEPTH, mode=Mode.SUBTRACT)

    # 草图11 → 切除-拉伸9 (cut)
    with BuildSketch(Plane.XY.offset(3)):
        with Locations((7.8, -114)):
            Circle(SKETCH_11_R)
        with Locations((83.8, -114)):
            Circle(SKETCH_11_R)
        with Locations((83.8, -226)):
            Circle(SKETCH_11_R)
        with Locations((7.8, -226)):
            Circle(SKETCH_11_R)
    extrude(amount=-CUT_EXTRUDE_9_DEPTH, mode=Mode.SUBTRACT)

    # 草图12 → 切除-拉伸10 (cut)
    with BuildSketch(Plane.XY.offset(3)):
        with Locations((60.293037421, 31.673618055)):
            Rectangle(SKETCH_12_W, SKETCH_12_H)
        with Locations((65.887141712, -373.302215973)):
            Rectangle(SKETCH_12_W_2, SKETCH_12_H_2)
    extrude(amount=-CUT_EXTRUDE_10_DEPTH, mode=Mode.SUBTRACT)

    # 圆角4
    fillet_4_edges = [part.edges().sort_by_distance(p)[0] for p in [
        (0, 0, 1.5),
        (91.6, 0, 1.5),
        (91.6, -340, 1.5),
        (0, -340, 1.5),
    ]]
    fillet(fillet_4_edges, radius=FILLET_4_R)


solid = part.part
